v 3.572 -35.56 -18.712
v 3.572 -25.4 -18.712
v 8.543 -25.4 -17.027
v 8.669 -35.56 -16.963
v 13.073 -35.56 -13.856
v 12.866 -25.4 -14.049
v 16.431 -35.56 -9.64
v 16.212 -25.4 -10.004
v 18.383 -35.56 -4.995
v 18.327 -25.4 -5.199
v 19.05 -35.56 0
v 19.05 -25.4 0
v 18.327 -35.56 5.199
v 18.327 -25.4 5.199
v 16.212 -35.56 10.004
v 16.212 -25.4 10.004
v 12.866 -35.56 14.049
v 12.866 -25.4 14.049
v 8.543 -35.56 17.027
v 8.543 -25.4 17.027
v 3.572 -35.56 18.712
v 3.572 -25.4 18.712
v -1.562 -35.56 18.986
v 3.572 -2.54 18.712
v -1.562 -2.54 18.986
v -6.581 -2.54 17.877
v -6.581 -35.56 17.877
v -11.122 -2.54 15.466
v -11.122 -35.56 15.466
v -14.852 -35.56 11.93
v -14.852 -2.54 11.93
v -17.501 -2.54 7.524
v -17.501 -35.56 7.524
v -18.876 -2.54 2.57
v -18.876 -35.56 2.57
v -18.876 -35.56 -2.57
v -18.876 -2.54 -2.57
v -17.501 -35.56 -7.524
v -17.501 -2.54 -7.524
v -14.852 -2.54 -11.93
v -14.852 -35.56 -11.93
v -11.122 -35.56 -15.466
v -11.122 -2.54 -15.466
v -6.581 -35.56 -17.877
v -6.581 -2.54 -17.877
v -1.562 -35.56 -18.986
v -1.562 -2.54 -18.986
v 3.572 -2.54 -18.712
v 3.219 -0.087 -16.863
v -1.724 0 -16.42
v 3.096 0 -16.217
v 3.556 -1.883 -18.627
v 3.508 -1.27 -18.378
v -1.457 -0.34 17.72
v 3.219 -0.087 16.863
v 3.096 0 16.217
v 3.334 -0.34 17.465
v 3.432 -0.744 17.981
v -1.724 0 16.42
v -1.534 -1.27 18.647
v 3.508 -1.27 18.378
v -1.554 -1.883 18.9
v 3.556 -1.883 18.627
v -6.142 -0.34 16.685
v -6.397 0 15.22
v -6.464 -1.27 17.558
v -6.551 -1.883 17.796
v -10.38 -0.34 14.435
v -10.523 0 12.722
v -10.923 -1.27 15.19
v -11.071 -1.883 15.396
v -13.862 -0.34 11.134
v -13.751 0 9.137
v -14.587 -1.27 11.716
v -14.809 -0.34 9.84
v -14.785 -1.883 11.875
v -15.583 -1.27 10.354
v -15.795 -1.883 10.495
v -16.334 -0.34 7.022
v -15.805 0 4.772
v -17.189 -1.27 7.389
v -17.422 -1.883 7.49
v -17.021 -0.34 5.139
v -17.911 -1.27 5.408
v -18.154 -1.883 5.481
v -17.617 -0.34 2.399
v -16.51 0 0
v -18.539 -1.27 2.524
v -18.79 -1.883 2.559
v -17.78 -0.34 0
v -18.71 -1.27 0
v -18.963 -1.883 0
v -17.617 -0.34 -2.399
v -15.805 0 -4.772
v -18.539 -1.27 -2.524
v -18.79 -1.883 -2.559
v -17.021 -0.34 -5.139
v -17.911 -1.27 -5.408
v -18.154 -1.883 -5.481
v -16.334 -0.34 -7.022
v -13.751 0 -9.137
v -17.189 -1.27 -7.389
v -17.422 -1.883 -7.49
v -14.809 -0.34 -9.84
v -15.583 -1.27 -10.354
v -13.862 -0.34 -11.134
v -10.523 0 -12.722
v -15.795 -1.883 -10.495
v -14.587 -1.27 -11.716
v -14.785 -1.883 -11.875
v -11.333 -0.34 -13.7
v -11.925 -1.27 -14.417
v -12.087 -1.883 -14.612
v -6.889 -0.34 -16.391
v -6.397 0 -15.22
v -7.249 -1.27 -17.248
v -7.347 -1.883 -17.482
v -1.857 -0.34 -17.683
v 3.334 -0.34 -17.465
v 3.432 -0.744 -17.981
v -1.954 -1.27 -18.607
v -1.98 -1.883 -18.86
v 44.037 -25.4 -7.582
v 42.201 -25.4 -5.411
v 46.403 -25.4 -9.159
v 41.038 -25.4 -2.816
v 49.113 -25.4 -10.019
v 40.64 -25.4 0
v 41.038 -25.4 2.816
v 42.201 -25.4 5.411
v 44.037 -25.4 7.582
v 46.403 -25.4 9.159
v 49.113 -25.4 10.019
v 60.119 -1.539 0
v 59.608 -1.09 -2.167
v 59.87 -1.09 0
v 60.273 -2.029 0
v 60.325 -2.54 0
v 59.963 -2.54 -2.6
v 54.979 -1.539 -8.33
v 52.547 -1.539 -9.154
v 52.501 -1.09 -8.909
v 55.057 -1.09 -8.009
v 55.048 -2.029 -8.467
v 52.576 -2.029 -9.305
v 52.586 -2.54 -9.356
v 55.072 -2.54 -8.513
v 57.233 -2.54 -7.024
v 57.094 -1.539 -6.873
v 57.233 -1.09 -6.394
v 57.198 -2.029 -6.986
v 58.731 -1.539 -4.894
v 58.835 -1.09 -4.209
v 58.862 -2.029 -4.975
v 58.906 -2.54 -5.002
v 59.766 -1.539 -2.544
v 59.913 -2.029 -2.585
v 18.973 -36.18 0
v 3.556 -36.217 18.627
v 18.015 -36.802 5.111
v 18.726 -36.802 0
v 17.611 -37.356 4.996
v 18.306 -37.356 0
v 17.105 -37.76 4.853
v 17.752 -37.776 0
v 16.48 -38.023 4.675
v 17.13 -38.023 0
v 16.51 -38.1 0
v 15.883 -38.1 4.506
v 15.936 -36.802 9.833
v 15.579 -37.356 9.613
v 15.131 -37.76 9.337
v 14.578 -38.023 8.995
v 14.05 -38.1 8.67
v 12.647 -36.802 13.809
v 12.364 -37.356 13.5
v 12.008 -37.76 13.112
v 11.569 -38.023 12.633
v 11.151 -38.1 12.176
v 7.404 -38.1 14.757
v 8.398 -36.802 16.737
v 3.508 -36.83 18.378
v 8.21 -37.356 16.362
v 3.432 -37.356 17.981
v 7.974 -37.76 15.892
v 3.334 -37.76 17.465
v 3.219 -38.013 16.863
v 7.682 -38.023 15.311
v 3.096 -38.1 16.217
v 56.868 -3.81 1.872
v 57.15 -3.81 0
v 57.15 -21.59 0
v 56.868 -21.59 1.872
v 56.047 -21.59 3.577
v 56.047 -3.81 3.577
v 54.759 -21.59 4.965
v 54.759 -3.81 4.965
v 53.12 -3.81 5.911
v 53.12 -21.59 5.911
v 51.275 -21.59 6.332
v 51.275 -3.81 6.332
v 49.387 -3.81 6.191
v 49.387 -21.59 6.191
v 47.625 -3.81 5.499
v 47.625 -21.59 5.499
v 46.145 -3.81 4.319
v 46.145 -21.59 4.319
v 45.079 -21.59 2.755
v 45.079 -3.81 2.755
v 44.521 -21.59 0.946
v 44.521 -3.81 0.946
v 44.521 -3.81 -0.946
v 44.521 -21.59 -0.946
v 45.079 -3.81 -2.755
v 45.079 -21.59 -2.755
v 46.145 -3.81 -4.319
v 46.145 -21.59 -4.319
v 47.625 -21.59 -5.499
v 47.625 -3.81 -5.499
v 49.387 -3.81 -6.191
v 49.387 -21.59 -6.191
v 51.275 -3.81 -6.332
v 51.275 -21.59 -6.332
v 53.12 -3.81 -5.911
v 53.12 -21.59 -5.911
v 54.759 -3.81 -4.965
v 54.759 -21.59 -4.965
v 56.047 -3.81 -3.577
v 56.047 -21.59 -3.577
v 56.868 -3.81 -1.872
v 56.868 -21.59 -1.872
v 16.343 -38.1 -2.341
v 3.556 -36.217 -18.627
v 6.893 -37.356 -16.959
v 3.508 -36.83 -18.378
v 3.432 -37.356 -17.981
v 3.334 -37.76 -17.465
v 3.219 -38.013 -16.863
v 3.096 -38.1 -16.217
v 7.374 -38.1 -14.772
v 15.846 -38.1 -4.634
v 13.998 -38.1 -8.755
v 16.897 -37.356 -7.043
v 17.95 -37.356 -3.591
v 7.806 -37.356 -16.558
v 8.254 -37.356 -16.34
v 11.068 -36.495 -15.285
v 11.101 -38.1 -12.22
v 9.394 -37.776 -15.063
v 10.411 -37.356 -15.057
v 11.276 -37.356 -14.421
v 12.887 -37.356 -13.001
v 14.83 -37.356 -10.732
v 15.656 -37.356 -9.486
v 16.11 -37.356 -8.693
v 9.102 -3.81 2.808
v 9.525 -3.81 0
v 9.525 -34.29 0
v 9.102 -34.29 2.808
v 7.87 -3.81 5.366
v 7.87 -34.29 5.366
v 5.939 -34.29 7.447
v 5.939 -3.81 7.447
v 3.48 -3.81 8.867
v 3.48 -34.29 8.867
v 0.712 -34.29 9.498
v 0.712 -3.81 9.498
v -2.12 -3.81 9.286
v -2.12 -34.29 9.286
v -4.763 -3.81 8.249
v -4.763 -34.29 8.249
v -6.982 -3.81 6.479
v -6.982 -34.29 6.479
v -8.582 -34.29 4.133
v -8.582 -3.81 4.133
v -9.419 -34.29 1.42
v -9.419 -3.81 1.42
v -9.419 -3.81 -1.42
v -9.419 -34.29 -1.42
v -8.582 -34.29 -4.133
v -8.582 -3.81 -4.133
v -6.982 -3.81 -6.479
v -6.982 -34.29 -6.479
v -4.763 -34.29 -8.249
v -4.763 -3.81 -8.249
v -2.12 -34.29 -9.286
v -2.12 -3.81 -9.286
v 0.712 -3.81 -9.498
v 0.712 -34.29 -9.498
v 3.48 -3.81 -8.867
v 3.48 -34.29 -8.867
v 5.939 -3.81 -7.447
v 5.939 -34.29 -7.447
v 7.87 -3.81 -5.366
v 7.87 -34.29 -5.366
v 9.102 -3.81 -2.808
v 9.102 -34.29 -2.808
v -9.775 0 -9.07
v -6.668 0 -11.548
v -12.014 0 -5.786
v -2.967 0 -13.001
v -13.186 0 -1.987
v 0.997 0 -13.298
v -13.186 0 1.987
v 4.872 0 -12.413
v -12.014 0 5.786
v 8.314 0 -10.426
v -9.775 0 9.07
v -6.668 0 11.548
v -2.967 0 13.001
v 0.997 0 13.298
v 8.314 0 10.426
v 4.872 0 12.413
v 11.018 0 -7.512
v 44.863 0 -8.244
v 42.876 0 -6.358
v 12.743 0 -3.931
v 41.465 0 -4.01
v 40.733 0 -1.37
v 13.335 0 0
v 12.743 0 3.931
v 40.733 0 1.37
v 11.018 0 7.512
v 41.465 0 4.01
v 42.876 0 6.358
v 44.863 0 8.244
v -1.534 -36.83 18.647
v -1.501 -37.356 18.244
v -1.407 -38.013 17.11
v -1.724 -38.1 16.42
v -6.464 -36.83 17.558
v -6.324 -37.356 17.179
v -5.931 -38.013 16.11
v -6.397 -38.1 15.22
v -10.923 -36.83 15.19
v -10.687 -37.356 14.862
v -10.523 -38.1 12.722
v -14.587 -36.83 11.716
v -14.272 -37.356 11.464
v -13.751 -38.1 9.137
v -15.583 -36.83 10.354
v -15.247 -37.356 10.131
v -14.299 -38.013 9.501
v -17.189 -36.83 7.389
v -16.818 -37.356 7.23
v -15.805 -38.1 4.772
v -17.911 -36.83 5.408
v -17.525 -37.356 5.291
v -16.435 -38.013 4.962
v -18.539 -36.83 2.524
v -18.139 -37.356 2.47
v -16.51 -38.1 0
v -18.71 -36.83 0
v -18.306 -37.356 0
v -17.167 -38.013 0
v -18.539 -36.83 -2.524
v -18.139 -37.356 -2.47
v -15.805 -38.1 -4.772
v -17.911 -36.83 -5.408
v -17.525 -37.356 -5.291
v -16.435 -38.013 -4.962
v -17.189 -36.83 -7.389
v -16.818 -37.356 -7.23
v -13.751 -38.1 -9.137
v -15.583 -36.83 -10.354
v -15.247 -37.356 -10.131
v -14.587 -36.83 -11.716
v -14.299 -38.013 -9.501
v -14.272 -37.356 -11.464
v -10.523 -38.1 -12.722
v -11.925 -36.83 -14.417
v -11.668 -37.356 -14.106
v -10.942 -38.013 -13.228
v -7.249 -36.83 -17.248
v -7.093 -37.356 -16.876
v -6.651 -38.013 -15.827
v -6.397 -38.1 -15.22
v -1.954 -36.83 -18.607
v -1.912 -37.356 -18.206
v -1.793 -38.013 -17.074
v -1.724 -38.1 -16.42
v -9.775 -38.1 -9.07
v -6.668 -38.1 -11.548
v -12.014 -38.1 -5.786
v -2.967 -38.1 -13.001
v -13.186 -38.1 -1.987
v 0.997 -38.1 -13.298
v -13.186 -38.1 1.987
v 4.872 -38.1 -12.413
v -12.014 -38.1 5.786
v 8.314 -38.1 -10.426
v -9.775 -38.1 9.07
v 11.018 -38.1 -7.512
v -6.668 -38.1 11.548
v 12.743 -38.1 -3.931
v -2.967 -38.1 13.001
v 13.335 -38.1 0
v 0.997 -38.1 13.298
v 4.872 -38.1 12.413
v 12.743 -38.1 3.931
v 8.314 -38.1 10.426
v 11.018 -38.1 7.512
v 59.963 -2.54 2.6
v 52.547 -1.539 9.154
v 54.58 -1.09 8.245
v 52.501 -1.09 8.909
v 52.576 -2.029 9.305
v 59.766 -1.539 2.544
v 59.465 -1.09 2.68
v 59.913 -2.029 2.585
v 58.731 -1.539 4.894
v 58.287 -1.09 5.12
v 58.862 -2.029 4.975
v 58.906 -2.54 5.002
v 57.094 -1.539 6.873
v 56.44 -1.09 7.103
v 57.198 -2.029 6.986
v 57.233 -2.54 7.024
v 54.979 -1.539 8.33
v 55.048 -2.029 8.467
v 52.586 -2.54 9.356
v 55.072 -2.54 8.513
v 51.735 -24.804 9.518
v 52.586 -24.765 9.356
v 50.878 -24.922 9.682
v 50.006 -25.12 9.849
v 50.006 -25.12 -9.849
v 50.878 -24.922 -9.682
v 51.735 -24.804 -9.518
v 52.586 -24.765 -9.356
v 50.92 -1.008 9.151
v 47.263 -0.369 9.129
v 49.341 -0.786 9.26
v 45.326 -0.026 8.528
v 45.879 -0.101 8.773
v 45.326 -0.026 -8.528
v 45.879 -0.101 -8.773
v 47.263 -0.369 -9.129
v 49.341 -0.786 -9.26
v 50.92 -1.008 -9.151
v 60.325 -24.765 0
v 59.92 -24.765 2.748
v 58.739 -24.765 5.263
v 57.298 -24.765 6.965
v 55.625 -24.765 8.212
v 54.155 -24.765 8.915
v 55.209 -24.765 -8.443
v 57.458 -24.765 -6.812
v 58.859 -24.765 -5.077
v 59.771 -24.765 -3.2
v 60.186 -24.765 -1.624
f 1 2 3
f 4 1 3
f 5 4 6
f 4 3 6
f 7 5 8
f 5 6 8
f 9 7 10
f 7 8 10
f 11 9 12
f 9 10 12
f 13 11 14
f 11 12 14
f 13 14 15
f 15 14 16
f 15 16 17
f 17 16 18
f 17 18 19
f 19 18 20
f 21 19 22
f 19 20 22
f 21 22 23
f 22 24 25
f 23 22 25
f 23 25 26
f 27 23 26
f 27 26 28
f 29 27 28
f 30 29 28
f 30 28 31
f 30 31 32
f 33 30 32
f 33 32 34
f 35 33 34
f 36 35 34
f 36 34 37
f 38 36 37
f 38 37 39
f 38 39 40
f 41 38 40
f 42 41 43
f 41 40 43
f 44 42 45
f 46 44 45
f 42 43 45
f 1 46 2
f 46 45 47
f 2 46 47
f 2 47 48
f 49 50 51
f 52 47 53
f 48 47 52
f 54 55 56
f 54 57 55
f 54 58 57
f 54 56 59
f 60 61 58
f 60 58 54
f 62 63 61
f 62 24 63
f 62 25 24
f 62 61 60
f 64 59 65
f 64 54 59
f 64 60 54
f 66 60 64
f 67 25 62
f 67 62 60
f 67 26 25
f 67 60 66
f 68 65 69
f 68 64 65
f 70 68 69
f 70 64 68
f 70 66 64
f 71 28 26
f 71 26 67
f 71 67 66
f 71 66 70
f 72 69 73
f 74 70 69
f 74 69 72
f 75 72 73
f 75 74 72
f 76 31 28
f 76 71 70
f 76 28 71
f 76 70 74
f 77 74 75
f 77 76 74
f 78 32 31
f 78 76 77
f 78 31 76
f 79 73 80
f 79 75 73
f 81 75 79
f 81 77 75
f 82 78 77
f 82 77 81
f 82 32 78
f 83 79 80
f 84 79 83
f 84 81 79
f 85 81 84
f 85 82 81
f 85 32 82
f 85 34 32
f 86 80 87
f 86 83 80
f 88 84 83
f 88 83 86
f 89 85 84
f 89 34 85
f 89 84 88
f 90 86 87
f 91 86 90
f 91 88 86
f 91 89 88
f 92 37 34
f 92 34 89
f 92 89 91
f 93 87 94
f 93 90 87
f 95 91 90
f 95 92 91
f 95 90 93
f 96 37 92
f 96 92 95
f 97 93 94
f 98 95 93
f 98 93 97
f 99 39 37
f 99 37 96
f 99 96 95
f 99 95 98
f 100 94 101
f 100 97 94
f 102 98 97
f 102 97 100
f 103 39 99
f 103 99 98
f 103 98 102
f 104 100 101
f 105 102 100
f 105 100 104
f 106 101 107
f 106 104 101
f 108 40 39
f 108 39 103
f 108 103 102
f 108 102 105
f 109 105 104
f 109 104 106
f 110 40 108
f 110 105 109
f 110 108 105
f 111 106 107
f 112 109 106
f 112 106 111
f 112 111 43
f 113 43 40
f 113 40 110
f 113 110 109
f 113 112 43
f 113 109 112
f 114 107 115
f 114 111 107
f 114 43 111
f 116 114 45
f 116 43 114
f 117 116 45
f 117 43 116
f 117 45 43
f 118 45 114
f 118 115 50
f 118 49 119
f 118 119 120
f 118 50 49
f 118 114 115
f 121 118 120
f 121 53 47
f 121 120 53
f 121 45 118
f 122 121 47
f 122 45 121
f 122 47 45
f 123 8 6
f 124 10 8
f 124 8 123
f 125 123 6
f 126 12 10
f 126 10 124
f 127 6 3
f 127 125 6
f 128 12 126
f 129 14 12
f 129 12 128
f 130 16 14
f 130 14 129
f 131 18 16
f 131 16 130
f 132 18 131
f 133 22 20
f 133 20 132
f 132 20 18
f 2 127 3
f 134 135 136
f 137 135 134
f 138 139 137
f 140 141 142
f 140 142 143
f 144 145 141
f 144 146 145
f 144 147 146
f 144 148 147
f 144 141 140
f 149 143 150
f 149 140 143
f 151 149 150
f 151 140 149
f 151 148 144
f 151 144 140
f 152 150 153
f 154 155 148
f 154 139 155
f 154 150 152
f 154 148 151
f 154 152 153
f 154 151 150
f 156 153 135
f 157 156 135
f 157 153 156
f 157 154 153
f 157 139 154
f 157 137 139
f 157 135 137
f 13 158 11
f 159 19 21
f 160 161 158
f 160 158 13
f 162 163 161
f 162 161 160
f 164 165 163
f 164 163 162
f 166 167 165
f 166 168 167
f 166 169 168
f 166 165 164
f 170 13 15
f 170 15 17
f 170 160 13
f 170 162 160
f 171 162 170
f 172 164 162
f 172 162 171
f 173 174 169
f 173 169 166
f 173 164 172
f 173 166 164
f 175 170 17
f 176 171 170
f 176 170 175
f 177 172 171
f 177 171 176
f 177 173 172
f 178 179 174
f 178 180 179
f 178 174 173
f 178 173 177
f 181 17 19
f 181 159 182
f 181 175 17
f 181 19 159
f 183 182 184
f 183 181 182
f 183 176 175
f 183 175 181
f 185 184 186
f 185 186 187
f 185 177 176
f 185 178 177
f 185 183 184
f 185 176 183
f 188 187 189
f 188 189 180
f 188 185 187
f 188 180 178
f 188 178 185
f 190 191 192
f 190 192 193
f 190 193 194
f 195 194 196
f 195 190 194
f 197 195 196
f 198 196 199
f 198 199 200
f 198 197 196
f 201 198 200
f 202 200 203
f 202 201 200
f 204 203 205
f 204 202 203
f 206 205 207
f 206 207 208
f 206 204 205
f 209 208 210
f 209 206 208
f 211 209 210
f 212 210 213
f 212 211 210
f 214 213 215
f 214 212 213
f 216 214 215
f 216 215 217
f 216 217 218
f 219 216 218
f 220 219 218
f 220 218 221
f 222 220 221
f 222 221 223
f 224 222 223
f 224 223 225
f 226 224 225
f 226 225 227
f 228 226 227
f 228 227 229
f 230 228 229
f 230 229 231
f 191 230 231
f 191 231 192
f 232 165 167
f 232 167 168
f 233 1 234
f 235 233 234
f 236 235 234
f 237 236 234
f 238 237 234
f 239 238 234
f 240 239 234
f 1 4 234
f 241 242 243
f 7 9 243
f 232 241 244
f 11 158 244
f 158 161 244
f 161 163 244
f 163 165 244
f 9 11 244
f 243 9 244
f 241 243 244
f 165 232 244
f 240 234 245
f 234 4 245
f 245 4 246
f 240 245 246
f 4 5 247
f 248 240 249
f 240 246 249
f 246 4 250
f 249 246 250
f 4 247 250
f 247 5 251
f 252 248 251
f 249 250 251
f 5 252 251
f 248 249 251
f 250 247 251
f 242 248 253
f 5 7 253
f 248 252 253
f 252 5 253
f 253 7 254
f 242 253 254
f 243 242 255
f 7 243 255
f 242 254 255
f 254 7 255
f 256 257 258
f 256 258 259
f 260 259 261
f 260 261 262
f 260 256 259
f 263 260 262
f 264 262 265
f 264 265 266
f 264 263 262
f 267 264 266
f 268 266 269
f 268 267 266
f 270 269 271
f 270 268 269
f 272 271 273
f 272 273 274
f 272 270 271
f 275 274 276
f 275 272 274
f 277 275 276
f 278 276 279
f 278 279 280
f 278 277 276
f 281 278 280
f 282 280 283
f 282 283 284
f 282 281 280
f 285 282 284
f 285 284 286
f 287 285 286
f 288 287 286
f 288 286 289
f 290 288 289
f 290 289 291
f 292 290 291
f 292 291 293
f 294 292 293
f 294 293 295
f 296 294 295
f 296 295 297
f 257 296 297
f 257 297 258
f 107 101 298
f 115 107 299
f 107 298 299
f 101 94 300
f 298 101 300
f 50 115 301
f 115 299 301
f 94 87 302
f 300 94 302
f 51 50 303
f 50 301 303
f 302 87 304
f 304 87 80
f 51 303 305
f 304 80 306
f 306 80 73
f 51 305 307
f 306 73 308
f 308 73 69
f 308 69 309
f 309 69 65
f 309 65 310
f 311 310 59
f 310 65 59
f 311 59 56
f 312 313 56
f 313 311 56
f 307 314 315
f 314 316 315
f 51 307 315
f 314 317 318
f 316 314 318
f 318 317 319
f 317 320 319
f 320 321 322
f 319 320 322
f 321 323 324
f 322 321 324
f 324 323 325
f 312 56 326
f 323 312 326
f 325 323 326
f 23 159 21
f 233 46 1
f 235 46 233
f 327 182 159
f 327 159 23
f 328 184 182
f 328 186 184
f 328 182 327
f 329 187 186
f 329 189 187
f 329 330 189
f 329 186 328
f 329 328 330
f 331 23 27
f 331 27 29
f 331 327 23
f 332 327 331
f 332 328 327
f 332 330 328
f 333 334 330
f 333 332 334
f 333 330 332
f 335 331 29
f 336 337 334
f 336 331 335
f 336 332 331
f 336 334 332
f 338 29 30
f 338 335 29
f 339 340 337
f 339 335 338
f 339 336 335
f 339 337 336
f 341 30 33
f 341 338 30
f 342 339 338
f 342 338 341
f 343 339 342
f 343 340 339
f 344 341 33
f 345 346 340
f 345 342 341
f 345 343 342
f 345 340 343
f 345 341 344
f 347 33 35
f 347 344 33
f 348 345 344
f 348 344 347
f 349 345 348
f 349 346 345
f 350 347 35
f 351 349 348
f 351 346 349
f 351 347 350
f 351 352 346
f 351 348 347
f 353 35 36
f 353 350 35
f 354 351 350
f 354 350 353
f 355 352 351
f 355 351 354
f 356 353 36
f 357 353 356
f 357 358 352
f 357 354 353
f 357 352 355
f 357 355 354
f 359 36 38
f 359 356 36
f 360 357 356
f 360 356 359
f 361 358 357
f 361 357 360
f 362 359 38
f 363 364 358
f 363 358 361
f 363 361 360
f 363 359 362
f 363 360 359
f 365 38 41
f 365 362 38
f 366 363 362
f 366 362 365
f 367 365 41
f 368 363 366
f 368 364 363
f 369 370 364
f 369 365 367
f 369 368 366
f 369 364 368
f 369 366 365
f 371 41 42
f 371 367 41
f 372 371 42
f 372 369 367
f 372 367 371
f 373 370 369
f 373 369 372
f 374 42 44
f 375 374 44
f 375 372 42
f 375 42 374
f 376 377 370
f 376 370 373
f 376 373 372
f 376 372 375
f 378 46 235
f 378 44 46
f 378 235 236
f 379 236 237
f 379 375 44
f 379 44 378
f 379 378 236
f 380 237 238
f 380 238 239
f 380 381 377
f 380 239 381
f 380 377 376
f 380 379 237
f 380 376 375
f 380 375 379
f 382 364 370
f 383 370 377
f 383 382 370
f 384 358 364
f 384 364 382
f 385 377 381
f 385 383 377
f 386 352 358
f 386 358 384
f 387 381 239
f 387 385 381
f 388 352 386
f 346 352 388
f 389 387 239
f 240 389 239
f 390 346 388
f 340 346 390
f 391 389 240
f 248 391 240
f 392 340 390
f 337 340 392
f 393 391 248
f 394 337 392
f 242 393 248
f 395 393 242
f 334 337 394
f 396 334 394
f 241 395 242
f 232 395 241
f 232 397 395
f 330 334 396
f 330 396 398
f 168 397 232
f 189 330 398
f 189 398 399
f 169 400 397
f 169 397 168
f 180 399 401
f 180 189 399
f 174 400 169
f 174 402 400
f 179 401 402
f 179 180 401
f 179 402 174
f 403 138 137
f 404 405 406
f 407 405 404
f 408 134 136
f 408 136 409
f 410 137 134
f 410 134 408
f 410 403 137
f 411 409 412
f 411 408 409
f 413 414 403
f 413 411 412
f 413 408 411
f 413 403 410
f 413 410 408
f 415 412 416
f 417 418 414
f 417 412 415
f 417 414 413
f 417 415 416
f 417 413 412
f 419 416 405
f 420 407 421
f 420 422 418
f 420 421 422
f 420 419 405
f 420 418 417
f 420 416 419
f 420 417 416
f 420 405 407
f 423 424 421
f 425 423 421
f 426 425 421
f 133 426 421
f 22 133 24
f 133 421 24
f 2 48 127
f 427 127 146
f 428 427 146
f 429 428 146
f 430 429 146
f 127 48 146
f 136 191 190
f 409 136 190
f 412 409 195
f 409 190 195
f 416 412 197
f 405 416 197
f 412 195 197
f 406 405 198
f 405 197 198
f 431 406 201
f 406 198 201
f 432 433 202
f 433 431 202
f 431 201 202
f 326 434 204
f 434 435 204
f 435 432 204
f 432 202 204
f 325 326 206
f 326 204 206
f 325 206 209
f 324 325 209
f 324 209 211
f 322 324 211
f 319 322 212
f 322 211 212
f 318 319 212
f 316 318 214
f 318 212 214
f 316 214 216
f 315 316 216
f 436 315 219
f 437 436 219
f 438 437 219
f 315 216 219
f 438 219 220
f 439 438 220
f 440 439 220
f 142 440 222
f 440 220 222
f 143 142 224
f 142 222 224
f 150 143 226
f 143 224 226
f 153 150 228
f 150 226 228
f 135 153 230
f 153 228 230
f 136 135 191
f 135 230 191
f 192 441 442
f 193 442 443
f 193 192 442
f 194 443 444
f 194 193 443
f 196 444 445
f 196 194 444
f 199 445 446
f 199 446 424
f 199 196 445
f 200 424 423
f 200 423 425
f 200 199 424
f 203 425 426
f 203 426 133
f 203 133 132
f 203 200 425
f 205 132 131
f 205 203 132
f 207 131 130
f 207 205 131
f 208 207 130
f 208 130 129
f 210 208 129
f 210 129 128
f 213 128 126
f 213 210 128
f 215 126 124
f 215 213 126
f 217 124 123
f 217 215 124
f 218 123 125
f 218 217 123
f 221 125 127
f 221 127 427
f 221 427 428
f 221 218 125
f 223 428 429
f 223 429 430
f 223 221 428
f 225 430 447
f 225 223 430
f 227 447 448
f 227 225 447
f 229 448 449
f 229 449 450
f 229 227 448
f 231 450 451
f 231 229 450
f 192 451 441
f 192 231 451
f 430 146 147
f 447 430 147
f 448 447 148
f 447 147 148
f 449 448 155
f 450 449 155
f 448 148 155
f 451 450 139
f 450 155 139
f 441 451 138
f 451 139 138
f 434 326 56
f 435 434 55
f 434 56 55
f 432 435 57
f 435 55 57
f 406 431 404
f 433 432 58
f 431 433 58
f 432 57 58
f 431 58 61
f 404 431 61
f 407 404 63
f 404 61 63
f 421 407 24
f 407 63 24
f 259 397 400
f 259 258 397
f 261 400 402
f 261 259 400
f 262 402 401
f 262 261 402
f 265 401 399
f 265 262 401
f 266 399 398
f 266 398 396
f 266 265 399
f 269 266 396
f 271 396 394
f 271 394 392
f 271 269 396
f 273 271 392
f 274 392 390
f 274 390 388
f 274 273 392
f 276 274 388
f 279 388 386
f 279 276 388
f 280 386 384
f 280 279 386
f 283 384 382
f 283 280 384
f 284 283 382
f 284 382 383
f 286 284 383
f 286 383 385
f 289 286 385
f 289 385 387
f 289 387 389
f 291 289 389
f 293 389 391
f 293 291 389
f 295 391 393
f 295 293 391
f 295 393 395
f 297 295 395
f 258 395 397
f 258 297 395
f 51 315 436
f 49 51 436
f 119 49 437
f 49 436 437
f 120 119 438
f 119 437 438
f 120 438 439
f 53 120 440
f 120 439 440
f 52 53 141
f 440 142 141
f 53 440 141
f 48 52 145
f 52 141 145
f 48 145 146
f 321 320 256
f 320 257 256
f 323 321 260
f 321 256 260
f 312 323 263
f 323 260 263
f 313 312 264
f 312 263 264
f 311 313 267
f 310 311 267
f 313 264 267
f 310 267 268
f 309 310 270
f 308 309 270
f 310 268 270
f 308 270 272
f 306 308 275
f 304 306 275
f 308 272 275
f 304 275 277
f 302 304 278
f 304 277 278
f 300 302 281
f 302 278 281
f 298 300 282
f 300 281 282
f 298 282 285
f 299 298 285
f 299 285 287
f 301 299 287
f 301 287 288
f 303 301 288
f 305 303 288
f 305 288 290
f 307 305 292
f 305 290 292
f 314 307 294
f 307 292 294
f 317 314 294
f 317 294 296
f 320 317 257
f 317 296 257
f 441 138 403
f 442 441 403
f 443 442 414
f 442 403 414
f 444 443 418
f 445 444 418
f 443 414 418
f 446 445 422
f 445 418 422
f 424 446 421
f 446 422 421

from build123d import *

# Parameters (mm, degrees)
F0_R     = 9.525
F0_R_2   = 6.35
F1_DEPTH = 25.4
F2_DEPTH = 38.1
F3_R     = 2.54


# Not quite as in the source:
# - a fillet or chamfer that OpenCascade refuses, or shapes differently, is made with other operations: its cross-section is extruded or revolved along the edge and cut away or added


with BuildPart() as f1:
    # F0 (on Front) → F1 (new body)
    with BuildSketch(Plane.XZ):
        with BuildLine():
            ThreePointArc((3.571875, -18.7121406842), (14.6790108446, -12.1420402167), (19.05, 0))
            ThreePointArc((19.05, 0), (14.6790108446, 12.1420402167), (3.571875, 18.7121406842))
            ThreePointArc((3.571875, 18.7121406842), (-19.05, 0), (3.571875, -18.7121406842))
        make_face()
        Circle(F0_R, mode=Mode.SUBTRACT)
        with BuildLine():
            ThreePointArc((3.571875, 18.7121406842), (14.6790108446, 12.1420402167), (19.05, 0))
            ThreePointArc((19.05, 0), (14.6790108446, -12.1420402167), (3.571875, -18.7121406842))
            Line((3.571875, -18.7121406842), (52.5859375, -9.3560703421))
            ThreePointArc((52.5859375, -9.3560703421), (41.275, 0), (52.5859375, 9.3560703421))
            Line((52.5859375, 9.3560703421), (3.571875, 18.7121406842))
        make_face()
        with BuildLine():
            ThreePointArc((60.325, 0), (58.1395054223, 6.0710201084), (52.5859375, 9.3560703421))
            ThreePointArc((52.5859375, 9.3560703421), (41.275, 0), (52.5859375, -9.3560703421))
            ThreePointArc((52.5859375, -9.3560703421), (58.1395054223, -6.0710201084), (60.325, 0))
        make_face()
        with Locations((50.8, 0)):
            Circle(F0_R_2, mode=Mode.SUBTRACT)
    extrude(amount=F1_DEPTH)

    # F0 (on Front) → F2 (join)
    with BuildSketch(Plane.XZ):
        with BuildLine():
            ThreePointArc((3.571875, -18.7121406842), (14.6790108446, -12.1420402167), (19.05, 0))
            ThreePointArc((19.05, 0), (14.6790108446, 12.1420402167), (3.571875, 18.7121406842))
            ThreePointArc((3.571875, 18.7121406842), (-19.05, 0), (3.571875, -18.7121406842))
        make_face()
        Circle(F0_R, mode=Mode.SUBTRACT)
    extrude(amount=F2_DEPTH)

    # F3
    f3_edges = [f1.edges().sort_by_distance(p)[0] for p in [
        (28.078906, 0, -14.034106),
        (-3.571875, -38.1, 18.712141),
    ]]
    fillet(f3_edges, radius=F3_R)

    # F4: chamfer of 3.81 on 4 edges, made by hand

    # F4_s1 → F4_t2 (revolve, cut)
    with BuildSketch(Plane.XY):
        Polygon((13.335, -38.1), (9.525, -34.29), (9.525, -38.1), align=None)
    revolve(axis=Axis((0, -38.1, 0), (0, -1, 0)), mode=Mode.SUBTRACT)

    # F4_s3 → F4_t4 (revolve, cut)
    with BuildSketch(Plane.XY):
        Polygon((60.96, -25.4), (57.15, -21.59), (57.15, -25.4), align=None)
    revolve(axis=Axis((50.8, -25.4, 0), (0, -1, 0)), mode=Mode.SUBTRACT)

    # F4_s5 → F4_t6 (revolve, cut)
    with BuildSketch(Plane.XY):
        Polygon((13.335, 0), (9.525, -3.81), (9.525, 0), align=None)
    revolve(axis=Axis((0, 0, 0), (0, -1, 0)), mode=Mode.SUBTRACT)

    # F4_s7 → F4_t8 (revolve, cut)
    with BuildSketch(Plane.XY):
        Polygon((60.96, 0), (57.15, -3.81), (57.15, 0), align=None)
    revolve(axis=Axis((50.8, 0, 0), (0, -1, 0)), mode=Mode.SUBTRACT)


solid = f1.part
